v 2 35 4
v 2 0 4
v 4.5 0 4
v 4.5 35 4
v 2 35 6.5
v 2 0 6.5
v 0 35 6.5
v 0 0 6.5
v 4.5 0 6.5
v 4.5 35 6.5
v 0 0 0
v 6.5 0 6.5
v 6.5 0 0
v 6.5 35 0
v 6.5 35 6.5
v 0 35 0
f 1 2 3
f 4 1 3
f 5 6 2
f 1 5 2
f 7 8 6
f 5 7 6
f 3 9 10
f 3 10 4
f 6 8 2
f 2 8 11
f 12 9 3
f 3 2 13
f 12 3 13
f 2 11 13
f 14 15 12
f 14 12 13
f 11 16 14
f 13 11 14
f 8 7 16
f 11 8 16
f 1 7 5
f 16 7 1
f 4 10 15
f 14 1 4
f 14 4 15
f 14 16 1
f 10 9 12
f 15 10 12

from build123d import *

# Parameters (mm, degrees)
SKETCH1_W               = 6.5
SKETCH1_H               = 6.5
BOSS_EXTRUDE1_DEPTH     = 35
CUT_EXTRUDE1_DEPTH      = 37.187014245
CUT_EXTRUDE1_DEPTH_BACK = 37.187014245
SKETCH2_W               = 2.5
SKETCH2_H               = 2.5


with BuildPart() as part:
    # Sketch1 → Boss-Extrude1 (new body)
    with BuildSketch(Plane(origin=(0, 0, 0), x_dir=(1, 0, 0), z_dir=(0, 1, 0))):
        with Locations((3.25, -3.25)):
            Rectangle(SKETCH1_W, SKETCH1_H)
    extrude(amount=BOSS_EXTRUDE1_DEPTH)

    # Sketch2 → Cut-Extrude1 (cut, two sides: drawn at the far end of the back side and taken through both)
    with BuildSketch(Plane(origin=(0, 35, 0), x_dir=(1, 0, 0), z_dir=(0, 1, 0)).offset(-CUT_EXTRUDE1_DEPTH_BACK)):
        with Locations((3.25, -5.25)):
            Rectangle(SKETCH2_W, SKETCH2_H)
    extrude(amount=CUT_EXTRUDE1_DEPTH + CUT_EXTRUDE1_DEPTH_BACK, mode=Mode.SUBTRACT)


solid = part.part
